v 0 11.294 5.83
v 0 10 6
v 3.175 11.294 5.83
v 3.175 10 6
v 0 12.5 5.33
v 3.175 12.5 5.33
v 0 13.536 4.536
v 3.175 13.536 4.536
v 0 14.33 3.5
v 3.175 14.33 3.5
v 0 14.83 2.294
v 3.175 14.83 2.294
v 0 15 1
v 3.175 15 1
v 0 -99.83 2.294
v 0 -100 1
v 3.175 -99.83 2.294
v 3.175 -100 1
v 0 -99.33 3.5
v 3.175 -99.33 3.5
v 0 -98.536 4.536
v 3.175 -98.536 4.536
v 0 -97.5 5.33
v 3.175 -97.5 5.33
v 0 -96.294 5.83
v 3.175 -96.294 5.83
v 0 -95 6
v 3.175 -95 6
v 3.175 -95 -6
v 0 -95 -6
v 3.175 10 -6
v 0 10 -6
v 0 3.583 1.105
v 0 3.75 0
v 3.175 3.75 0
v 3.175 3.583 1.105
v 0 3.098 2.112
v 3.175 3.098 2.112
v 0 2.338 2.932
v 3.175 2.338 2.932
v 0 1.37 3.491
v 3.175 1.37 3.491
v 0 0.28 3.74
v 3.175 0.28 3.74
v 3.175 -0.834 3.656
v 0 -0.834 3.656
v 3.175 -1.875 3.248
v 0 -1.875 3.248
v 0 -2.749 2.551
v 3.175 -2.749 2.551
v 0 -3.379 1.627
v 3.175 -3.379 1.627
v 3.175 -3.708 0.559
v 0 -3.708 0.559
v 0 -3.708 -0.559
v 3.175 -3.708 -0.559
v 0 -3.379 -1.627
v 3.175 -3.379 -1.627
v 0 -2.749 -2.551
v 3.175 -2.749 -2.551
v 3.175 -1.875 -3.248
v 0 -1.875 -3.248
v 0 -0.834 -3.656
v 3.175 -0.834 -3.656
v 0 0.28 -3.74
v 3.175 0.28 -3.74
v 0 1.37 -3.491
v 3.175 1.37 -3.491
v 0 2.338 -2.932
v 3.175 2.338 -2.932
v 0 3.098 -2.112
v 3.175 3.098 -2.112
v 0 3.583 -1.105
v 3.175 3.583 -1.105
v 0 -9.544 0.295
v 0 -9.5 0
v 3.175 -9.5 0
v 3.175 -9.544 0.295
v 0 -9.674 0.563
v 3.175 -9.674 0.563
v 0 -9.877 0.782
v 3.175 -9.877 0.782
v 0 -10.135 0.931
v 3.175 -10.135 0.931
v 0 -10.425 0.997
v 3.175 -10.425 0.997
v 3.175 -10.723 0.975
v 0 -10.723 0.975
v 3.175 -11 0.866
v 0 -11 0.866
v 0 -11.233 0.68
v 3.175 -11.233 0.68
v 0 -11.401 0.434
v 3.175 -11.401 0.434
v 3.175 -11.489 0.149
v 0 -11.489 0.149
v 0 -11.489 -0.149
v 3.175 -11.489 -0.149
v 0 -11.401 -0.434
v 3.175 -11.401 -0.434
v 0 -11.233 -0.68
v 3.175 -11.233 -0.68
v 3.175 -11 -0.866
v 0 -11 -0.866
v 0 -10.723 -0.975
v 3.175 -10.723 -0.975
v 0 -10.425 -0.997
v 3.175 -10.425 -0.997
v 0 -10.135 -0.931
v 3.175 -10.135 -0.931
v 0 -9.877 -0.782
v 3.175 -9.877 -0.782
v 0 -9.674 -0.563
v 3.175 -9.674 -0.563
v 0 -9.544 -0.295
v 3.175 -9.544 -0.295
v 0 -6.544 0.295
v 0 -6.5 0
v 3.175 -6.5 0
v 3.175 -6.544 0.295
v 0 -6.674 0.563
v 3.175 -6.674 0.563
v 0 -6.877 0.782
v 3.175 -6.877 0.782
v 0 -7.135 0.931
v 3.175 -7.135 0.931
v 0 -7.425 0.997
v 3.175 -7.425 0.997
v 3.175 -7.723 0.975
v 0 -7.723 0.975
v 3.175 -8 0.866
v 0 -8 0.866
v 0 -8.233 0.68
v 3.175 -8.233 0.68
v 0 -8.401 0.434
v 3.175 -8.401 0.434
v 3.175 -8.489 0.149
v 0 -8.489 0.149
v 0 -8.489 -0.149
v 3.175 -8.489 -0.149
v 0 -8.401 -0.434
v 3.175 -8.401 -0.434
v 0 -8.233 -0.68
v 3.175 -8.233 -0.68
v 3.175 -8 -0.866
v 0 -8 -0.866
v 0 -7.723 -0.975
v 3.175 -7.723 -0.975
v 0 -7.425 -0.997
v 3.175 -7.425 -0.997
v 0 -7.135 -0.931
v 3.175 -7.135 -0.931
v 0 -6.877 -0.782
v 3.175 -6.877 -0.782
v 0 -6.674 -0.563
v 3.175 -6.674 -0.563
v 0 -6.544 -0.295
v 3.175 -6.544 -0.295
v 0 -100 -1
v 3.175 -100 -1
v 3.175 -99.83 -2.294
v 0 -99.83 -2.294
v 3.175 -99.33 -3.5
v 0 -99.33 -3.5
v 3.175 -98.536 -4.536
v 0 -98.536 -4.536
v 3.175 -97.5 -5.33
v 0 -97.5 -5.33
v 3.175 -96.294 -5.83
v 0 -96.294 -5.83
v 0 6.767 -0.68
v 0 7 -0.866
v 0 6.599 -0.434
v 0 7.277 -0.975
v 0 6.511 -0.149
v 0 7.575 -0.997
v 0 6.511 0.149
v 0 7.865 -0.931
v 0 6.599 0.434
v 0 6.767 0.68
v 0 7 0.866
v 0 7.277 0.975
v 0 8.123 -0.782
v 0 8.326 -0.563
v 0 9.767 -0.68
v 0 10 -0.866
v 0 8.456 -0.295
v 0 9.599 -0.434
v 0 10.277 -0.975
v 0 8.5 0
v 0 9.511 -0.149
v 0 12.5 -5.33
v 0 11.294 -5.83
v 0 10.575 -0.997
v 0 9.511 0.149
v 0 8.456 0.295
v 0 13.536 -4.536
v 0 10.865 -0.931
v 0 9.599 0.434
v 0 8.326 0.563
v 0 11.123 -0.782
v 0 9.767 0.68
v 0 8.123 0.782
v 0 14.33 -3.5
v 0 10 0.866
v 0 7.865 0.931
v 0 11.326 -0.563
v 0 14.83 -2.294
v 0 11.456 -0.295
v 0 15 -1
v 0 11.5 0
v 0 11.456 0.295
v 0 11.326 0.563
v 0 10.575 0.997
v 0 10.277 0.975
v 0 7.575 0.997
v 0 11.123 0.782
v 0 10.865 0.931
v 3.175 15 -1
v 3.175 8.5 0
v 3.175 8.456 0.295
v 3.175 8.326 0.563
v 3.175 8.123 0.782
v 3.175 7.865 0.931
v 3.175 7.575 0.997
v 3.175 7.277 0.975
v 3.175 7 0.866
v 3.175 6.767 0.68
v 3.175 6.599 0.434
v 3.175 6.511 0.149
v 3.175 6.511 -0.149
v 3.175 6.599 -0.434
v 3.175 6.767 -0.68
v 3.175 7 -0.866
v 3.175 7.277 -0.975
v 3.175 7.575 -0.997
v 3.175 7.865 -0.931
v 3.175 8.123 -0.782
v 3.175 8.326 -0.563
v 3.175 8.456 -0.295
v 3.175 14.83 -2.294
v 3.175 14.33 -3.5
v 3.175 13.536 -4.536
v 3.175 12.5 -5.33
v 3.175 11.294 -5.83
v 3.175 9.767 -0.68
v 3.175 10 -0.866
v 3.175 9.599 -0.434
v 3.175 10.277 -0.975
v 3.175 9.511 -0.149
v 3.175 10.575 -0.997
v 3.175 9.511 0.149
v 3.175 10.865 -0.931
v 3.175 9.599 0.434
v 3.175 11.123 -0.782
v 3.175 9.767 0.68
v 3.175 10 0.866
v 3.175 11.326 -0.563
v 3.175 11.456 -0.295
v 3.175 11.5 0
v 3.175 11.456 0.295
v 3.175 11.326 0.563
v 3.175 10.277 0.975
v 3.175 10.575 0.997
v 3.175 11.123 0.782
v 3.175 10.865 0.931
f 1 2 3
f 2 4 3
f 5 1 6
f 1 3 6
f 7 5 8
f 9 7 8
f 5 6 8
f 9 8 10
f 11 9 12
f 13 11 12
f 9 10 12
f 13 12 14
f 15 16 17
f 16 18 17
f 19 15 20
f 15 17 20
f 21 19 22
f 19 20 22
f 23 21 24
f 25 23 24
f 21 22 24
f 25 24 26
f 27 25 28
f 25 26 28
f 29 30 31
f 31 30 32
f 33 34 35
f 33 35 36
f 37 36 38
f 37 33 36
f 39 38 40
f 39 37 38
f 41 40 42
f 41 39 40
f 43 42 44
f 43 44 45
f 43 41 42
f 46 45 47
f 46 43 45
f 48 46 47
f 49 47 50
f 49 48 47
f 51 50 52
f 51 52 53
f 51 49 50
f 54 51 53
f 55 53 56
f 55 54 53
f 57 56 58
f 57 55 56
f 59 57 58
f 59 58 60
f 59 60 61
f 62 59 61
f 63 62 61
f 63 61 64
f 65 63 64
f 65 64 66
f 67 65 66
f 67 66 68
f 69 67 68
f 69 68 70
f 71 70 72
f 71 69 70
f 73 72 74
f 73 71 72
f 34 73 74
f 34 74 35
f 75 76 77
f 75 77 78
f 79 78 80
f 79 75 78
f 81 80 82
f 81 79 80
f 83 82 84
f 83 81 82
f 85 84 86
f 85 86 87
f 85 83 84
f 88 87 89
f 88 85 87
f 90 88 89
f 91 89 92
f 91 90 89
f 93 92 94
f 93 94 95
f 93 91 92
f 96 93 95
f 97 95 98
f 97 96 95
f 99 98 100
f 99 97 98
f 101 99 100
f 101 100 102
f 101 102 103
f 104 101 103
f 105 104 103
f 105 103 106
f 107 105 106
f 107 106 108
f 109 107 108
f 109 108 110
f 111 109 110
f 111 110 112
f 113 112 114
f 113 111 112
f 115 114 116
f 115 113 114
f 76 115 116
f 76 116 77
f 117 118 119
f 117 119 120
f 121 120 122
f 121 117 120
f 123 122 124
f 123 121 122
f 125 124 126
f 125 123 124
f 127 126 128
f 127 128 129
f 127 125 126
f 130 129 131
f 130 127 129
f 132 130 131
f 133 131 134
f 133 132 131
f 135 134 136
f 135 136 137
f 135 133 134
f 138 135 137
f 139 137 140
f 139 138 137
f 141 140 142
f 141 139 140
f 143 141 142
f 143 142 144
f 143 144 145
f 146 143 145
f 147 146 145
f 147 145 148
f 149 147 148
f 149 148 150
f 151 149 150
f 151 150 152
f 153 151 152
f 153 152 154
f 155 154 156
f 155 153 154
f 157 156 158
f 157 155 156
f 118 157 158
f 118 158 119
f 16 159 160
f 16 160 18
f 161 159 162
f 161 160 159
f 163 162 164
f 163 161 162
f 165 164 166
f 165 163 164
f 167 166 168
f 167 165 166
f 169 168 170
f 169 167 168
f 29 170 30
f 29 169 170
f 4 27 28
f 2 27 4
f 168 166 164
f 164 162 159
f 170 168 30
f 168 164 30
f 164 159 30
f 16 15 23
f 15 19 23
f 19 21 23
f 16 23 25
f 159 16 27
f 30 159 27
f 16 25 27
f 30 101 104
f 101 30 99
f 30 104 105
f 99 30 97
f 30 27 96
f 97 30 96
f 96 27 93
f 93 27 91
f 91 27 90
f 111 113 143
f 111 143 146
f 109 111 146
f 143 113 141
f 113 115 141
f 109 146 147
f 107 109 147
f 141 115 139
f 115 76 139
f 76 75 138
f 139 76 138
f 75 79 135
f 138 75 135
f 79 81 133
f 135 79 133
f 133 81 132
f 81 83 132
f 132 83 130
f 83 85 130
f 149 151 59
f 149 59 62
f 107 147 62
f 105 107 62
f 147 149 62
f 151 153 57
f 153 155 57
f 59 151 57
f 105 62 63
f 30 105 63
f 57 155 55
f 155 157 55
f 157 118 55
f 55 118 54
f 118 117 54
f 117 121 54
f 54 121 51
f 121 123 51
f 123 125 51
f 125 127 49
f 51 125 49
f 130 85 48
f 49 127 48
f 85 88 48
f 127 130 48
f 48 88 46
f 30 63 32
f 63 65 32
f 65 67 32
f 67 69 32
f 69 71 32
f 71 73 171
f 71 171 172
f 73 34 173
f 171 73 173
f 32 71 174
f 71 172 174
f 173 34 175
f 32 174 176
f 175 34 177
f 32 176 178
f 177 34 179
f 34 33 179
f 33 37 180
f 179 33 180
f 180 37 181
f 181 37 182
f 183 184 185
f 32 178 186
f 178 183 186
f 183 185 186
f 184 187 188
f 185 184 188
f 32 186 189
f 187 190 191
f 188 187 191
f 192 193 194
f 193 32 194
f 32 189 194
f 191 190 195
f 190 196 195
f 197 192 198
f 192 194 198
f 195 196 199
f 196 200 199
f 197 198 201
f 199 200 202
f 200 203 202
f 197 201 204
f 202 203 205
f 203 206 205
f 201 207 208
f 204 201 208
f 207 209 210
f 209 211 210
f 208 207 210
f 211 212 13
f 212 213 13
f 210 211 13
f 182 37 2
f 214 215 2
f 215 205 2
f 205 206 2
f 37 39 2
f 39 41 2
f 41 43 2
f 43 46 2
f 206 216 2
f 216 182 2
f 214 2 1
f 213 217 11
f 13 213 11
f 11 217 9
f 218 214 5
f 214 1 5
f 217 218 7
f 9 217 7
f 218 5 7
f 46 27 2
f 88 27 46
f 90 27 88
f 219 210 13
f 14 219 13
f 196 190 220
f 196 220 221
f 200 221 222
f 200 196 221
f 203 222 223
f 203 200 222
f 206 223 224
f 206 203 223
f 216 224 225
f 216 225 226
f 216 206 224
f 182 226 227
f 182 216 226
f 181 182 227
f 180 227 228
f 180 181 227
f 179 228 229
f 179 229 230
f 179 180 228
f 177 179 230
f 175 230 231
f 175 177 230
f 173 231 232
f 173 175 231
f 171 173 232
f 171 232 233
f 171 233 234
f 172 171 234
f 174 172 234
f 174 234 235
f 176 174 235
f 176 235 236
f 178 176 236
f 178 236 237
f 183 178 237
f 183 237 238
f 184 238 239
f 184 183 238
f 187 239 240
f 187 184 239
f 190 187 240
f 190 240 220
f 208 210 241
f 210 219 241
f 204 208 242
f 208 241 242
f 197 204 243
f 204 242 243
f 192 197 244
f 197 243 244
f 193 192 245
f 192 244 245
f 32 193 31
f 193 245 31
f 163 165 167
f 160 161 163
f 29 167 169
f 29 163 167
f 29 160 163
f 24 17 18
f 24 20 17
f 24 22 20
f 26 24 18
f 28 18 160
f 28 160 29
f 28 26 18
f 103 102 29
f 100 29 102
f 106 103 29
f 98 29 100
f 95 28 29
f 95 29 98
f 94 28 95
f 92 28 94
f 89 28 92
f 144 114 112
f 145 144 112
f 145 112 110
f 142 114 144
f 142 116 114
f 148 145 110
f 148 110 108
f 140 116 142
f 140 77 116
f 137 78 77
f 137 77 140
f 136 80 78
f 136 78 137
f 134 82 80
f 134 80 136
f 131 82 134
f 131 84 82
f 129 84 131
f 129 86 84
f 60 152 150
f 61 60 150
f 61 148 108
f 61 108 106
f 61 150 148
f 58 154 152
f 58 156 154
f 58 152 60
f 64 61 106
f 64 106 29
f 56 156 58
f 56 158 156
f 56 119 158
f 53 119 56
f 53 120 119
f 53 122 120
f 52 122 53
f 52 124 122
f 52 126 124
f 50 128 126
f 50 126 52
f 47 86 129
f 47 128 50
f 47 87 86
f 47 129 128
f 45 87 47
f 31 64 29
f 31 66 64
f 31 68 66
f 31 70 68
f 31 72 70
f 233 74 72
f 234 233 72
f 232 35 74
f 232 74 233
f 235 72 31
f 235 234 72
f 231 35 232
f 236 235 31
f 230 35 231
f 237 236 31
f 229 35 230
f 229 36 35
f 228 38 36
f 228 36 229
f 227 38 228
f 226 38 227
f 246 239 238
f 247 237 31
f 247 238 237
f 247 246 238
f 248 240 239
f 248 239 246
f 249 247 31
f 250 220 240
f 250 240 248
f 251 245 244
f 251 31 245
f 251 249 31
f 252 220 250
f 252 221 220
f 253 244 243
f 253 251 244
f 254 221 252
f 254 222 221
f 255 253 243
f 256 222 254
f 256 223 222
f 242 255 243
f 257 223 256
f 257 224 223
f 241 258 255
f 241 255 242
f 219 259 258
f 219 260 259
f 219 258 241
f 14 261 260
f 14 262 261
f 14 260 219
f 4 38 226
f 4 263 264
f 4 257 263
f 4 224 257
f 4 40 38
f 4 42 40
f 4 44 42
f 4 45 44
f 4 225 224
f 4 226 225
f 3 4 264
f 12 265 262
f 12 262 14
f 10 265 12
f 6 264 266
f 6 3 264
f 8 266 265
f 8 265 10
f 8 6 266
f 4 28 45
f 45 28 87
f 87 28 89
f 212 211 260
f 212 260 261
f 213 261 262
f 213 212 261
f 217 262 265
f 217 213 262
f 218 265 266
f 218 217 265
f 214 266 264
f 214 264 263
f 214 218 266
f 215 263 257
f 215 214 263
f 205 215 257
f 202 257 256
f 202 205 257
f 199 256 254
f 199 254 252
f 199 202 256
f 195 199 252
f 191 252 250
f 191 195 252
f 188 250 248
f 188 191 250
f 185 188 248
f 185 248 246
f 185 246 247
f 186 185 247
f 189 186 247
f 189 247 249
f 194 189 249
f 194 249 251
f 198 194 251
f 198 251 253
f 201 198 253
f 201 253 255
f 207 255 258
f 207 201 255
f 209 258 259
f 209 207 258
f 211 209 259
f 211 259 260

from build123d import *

# Parameters (mm, degrees)
F0_W     = 115
F0_H     = 12
F0_R     = 1
F0_R_2   = 3.75
F1_DEPTH = 3.175
F2_R     = 5
F3_R     = 5
F4_R     = 5
F5_R     = 5


# Not quite as in the source:
# - a length typed as a fraction of an inch, garbled in the dataset ("3 / 203.2 mm" for 3/8 in), is restored


with BuildPart() as f1:
    # F0 (on Right) → F1 (new body)
    with BuildSketch(Plane.YZ):
        with Locations((-42.5, 0)):
            Rectangle(F0_W, F0_H)
        with Locations((-10.5, 0)):
            Circle(F0_R, mode=Mode.SUBTRACT)
        with Locations((-7.5, 0)):
            Circle(F0_R, mode=Mode.SUBTRACT)
        Circle(F0_R_2, mode=Mode.SUBTRACT)
        with Locations((7.5, 0)):
            Circle(F0_R, mode=Mode.SUBTRACT)
        with Locations((10.5, 0)):
            Circle(F0_R, mode=Mode.SUBTRACT)
    extrude(amount=F1_DEPTH)

    # F2
    f2_edges = [f1.edges().sort_by_distance(p)[0] for p in [
        (1.5875, -100, 6),
    ]]
    fillet(f2_edges, radius=F2_R)

    # F3
    f3_edges = [f1.edges().sort_by_distance(p)[0] for p in [
        (1.5875, -100, -6),
    ]]
    fillet(f3_edges, radius=F3_R)

    # F4
    f4_edges = [f1.edges().sort_by_distance(p)[0] for p in [
        (1.5875, 15, 6),
    ]]
    fillet(f4_edges, radius=F4_R)

    # F5
    f5_edges = [f1.edges().sort_by_distance(p)[0] for p in [
        (1.5875, 15, -6),
    ]]
    fillet(f5_edges, radius=F5_R)


solid = f1.part
